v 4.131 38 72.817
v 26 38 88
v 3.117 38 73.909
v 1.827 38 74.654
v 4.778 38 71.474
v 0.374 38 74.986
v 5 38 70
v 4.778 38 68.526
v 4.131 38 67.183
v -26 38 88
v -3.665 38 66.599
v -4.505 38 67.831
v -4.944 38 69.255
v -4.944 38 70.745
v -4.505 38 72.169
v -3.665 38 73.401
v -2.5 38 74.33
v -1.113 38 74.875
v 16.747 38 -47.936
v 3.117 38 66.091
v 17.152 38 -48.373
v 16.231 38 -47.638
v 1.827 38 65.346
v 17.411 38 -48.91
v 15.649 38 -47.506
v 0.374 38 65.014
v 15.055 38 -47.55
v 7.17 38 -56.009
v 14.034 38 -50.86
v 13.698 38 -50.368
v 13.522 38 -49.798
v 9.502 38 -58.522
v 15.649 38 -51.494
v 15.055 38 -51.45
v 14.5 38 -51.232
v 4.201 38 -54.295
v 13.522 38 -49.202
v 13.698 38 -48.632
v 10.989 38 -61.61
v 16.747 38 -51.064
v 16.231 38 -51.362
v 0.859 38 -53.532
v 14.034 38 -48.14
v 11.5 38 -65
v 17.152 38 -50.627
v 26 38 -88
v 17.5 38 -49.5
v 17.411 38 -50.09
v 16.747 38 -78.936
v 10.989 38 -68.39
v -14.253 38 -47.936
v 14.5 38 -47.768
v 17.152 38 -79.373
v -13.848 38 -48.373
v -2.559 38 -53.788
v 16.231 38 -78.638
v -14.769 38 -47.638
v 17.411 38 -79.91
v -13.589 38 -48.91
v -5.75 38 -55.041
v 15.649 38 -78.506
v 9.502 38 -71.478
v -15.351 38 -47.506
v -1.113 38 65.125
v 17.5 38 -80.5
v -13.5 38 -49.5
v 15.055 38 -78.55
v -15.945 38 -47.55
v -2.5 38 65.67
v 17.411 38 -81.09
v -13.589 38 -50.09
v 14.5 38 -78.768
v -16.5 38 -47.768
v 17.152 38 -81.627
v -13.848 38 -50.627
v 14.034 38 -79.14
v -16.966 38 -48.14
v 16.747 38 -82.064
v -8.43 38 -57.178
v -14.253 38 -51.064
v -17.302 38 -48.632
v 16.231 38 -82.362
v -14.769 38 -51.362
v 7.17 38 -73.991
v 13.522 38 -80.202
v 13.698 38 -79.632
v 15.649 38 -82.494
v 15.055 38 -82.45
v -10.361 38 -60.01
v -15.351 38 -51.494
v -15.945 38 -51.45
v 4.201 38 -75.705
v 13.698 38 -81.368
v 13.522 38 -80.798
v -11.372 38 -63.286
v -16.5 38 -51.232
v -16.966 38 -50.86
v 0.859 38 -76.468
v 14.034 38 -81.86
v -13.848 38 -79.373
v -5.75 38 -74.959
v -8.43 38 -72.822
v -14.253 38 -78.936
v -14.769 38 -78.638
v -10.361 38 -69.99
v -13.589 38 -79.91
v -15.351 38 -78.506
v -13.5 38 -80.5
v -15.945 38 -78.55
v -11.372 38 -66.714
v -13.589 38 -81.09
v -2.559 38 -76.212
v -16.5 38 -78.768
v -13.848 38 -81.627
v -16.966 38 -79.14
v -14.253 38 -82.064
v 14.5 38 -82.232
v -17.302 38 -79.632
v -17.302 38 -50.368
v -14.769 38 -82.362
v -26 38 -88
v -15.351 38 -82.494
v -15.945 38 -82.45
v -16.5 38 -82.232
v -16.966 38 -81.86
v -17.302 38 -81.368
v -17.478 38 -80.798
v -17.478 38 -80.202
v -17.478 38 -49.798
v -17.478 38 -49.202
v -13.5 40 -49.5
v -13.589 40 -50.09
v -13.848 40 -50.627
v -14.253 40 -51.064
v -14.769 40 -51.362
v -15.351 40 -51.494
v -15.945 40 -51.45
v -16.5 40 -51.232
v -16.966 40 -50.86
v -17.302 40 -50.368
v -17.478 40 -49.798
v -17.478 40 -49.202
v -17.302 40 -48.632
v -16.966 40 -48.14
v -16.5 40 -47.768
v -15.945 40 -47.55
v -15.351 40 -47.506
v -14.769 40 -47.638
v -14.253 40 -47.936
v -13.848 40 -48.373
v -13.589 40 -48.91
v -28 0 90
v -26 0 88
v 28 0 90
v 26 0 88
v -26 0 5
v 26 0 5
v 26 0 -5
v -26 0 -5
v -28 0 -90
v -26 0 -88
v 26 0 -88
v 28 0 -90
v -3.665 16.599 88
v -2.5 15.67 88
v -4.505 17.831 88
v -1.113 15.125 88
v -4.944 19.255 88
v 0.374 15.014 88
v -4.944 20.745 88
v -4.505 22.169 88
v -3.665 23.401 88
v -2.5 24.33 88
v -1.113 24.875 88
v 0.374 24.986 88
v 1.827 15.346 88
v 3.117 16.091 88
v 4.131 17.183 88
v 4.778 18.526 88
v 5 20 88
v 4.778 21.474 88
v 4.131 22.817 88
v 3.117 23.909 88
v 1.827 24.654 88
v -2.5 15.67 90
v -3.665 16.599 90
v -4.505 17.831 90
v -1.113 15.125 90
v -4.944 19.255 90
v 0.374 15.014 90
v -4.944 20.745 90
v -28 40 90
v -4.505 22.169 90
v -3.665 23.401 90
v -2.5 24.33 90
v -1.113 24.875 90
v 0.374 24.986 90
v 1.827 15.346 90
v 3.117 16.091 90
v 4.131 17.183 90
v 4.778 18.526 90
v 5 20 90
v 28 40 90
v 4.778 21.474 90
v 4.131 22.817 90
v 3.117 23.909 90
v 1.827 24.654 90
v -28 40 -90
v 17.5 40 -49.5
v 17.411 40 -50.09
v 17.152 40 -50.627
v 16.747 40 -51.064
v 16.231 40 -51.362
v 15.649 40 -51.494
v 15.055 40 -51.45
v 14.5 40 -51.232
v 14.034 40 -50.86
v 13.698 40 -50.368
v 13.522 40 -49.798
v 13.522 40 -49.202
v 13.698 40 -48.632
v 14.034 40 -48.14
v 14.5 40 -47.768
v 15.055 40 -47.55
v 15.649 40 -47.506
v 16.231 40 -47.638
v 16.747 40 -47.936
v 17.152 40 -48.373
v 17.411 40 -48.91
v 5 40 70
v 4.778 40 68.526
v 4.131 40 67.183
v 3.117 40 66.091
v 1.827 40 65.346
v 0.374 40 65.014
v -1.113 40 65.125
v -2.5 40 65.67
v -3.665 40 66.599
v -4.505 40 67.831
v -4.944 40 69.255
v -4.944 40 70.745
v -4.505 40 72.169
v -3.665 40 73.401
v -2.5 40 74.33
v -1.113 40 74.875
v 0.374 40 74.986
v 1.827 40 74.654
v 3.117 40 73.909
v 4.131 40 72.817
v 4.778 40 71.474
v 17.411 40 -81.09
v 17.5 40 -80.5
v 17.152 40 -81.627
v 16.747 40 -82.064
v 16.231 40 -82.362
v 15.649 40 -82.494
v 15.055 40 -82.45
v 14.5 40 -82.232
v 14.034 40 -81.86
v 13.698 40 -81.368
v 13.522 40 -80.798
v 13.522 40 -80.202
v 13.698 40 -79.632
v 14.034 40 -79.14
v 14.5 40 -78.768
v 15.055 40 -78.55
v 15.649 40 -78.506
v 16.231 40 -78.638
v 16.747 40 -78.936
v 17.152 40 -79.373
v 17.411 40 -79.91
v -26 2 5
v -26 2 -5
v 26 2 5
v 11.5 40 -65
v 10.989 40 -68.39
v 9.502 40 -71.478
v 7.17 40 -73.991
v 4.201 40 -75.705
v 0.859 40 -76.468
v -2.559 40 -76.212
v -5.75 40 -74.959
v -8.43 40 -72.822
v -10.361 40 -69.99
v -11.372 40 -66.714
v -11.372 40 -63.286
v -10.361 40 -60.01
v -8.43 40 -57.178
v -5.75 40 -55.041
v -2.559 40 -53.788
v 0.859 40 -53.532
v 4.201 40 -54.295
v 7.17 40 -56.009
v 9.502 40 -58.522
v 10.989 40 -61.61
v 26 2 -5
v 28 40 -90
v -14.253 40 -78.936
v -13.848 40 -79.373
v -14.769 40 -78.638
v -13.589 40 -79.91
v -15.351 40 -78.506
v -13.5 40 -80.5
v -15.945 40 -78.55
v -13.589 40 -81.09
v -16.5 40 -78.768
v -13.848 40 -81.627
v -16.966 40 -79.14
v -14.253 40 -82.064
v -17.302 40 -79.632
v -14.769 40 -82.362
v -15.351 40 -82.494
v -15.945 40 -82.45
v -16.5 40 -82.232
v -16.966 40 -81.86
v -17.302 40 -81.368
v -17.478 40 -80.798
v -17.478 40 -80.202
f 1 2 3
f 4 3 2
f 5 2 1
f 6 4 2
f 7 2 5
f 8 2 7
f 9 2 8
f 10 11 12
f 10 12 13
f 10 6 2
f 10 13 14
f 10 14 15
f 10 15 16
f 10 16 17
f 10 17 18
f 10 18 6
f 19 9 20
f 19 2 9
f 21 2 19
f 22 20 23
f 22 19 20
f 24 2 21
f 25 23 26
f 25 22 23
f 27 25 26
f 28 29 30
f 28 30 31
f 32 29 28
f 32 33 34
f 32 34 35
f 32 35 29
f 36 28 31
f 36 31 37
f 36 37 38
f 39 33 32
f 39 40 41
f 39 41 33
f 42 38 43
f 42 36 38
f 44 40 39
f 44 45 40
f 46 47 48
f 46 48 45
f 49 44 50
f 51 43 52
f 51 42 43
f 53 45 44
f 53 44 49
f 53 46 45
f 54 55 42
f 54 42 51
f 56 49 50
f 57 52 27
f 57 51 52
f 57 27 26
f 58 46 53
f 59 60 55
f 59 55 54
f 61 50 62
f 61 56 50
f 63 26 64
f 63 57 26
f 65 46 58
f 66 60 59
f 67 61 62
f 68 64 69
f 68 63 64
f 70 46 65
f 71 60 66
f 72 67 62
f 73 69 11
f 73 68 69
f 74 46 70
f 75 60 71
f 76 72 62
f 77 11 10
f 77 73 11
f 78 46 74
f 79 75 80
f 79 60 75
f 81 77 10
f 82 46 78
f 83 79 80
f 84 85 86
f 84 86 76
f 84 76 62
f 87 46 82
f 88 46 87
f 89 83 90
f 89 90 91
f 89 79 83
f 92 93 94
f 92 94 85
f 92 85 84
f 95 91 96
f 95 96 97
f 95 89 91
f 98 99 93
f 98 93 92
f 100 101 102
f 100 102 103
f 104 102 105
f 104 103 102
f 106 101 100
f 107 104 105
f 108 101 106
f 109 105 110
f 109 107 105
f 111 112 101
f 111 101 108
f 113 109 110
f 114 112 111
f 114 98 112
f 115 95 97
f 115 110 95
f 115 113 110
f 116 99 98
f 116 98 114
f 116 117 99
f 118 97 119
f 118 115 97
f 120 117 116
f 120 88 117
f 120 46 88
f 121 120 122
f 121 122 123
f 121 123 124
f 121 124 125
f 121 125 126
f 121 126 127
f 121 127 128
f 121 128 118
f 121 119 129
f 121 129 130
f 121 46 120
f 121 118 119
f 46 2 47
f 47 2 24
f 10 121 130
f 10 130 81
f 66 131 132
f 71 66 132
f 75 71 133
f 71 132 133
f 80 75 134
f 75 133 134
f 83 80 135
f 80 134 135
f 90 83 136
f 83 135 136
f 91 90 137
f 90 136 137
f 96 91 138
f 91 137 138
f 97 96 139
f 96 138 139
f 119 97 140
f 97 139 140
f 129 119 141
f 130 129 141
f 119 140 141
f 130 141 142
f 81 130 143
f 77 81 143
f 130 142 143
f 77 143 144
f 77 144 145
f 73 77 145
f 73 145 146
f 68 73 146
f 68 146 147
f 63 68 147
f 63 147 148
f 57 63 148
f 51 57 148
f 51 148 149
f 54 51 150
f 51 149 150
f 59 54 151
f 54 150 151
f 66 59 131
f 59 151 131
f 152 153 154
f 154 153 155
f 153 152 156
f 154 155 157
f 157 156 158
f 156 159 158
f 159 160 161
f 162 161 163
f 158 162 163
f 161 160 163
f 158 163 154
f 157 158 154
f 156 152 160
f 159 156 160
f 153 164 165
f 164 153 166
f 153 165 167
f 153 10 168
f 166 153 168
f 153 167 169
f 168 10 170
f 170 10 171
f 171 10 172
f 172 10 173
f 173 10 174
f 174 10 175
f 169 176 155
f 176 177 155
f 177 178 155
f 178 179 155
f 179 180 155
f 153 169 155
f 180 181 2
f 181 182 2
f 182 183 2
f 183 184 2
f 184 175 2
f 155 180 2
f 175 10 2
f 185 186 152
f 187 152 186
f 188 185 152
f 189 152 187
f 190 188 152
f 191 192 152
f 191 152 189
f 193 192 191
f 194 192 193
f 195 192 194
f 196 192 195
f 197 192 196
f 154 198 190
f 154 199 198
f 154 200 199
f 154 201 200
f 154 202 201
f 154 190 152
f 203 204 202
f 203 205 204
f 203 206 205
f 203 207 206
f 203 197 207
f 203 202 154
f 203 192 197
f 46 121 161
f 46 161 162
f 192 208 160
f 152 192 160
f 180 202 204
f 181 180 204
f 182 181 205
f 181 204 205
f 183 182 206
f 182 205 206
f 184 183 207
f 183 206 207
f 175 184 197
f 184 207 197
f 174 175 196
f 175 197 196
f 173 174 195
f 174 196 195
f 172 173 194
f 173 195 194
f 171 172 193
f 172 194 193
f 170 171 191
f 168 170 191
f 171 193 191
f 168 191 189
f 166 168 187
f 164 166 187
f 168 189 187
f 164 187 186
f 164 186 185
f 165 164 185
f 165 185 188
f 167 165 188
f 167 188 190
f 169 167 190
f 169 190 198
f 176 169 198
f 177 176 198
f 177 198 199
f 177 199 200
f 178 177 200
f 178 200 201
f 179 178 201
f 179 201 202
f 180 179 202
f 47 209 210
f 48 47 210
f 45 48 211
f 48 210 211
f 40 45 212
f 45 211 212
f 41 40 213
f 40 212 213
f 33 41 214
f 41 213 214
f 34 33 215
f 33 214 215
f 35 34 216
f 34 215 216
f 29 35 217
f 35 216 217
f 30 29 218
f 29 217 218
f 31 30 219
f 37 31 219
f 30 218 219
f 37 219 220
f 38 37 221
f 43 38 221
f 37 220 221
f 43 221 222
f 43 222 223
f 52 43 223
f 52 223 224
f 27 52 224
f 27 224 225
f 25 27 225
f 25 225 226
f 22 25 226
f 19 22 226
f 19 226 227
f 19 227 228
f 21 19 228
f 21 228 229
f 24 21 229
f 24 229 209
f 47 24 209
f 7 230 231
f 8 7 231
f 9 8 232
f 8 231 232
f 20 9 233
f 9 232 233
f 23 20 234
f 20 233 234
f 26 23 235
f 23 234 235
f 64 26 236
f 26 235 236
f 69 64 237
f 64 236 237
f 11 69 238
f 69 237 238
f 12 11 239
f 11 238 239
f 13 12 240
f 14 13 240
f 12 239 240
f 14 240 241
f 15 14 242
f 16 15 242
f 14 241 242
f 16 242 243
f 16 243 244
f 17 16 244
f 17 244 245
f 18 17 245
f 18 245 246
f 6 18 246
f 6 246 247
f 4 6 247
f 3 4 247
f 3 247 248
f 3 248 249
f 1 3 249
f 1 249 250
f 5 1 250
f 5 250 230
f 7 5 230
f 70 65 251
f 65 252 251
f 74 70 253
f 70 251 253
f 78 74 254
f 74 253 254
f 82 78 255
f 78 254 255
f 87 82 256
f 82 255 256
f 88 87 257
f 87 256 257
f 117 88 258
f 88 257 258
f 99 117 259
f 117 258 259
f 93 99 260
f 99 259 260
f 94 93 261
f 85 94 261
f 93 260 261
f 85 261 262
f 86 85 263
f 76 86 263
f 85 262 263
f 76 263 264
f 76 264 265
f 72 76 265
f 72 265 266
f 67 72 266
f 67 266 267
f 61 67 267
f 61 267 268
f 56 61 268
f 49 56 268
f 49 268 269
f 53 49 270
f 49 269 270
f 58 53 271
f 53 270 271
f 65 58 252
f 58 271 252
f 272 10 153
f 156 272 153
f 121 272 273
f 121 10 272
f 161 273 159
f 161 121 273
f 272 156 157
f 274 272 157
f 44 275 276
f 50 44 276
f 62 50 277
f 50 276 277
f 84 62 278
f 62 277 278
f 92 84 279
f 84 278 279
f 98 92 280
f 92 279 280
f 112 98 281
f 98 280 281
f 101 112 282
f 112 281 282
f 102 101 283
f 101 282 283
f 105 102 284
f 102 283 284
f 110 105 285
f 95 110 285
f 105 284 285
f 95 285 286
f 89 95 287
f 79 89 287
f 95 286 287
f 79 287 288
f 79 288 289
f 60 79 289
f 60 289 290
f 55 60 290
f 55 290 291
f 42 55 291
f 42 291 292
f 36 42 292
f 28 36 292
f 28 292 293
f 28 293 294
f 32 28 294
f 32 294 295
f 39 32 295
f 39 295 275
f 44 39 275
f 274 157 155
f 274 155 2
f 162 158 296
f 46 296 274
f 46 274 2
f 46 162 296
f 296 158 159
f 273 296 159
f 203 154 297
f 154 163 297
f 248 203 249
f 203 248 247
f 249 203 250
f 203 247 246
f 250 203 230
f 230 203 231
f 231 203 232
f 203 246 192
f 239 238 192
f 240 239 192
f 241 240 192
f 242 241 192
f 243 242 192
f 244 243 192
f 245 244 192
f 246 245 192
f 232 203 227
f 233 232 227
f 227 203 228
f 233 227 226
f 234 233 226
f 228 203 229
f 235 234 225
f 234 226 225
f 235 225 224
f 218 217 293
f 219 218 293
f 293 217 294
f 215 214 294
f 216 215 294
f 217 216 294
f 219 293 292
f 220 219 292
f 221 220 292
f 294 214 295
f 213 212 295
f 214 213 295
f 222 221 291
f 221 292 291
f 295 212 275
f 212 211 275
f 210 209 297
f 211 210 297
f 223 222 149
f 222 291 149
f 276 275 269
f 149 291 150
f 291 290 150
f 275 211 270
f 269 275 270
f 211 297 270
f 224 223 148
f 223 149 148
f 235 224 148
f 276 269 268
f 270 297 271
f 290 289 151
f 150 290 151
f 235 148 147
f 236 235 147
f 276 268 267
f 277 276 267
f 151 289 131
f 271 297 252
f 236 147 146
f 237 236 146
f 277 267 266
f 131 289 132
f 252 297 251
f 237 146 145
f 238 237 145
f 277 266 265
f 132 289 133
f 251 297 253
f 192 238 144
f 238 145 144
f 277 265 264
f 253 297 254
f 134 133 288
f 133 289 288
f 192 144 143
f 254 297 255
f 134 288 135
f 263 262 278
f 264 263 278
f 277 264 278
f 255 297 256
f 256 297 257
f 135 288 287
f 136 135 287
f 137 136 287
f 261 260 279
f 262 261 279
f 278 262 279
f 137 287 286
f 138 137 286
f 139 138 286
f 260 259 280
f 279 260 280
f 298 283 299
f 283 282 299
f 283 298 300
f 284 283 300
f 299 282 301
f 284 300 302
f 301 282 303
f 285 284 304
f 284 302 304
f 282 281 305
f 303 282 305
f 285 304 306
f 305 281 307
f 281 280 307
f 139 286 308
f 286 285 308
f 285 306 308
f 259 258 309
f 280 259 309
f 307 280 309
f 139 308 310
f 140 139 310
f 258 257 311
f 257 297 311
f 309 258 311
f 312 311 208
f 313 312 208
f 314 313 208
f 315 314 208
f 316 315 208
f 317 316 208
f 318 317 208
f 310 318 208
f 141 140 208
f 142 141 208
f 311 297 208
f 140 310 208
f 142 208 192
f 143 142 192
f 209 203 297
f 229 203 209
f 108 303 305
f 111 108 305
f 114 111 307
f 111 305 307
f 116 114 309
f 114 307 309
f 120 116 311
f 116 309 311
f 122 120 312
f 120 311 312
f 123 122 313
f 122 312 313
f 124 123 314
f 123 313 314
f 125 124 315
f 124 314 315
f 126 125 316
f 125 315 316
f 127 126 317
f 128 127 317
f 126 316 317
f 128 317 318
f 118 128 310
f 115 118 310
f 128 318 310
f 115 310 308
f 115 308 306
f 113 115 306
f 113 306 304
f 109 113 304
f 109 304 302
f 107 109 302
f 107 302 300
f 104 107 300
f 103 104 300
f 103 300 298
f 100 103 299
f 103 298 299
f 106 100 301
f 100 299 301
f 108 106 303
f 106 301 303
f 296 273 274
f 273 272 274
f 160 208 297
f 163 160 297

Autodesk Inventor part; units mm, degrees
ref_plane "YZ Plane" through (0, 0, 0) normal (1, 0, 0) x (0, 1, 0)
ref_plane "XZ Plane" through (0, 0, 0) normal (0, 1, 0) x (-1, 0, 0)
ref_plane "XY Plane" through (0, 0, 0) normal (0, 0, 1) x (1, 0, 0)
sketch "Sketch1" plane through (0, 0, 0) normal (0, 0, 1) x (1, 0, 0)
  line L0 (-28, 0) -> (28, 0)
  line L1 (28, 0) -> (28, 40)
  line L2 (28, 40) -> (-28, 40)
  line L3 (-28, 40) -> (-28, 0)
  point P0 (0, 0)
  point P1 (0, 0)
  dimension "d1" = 56
  dimension "d2" = 40
extrude "Extrusion1" add sketch "Sketch1" along normal mid plane 180
shell "Shell1" thickness 2 removed faces 1 at (-9.3333, 0, 30)
sketch "Sketch2" plane through (0, 0, 90) normal (0, 0, 1) x (1, 0, 0)
  circle A0 centre (0, 20) radius 5
  line L0 (-28, 0) -> (28, 0) construction
  line L1 (28, 0) -> (28, 40) construction
  point P0 (0, 0)
  point P1 (0, 0)
  point P2 (28, 20)
  dimension "d6" = 10
extrude "Extrusion2" cut sketch "Sketch2" against normal up to surface (2 mm away)
sketch "Sketch3" plane through (-28, 40, 90) normal (0, 1, 0) x (1, 0, 0)
  line L0 (56, 180) -> (56, 0) construction
  line L1 (56, 40) -> (0, 40) construction
  circle A0 centre (28, 155) radius 11.5
  circle A1 centre (12.5, 139.5) radius 2
  circle A2 centre (43.5, 170.5) radius 2
  circle A3 centre (12.5, 170.5) radius 2
  circle A4 centre (43.5, 139.5) radius 2
  line L2 (43.5, 139.5) -> (12.5, 139.5) construction
  line L3 (12.5, 139.5) -> (12.5, 170.5) construction
  line L4 (12.5, 170.5) -> (43.5, 170.5) construction
  line L5 (43.5, 170.5) -> (43.5, 139.5) construction
  line L6 (43.5, 139.5) -> (12.5, 170.5) construction
  line L7 (0, 0) -> (56, 0) construction
  line L8 (56, 0) -> (0, 40) construction
  line L9 (0, 180) -> (0, 0) construction
  circle A5 centre (28, 20) radius 5
  point P0 (28, 90)
  dimension "d9" = 40
  dimension "d10" = 4
  dimension "d11" = 23
  dimension "d12" = 115
  dimension "d13" = 31
  dimension "d16" = 10
extrude "Extrusion3" cut sketch "Sketch3" against normal up to surface (2 mm away)
sketch "Sketch4" plane through (-28, 0, 90) normal (0, -1, 0) x (1, 0, 0)
  line L0 (2, -178) -> (2, -2) projected
  line L1 (54, -95) -> (2, -95)
  line L2 (2, -95) -> (2, -85)
  line L3 (2, -85) -> (54, -85)
  line L4 (54, -85) -> (54, -95)
  line L5 (54, -95) -> (2, -85) construction
  line L6 (2, -95) -> (54, -85) construction
  point P0 (28, -90)
  dimension "d17" = 10
extrude "Extrusion4" add sketch "Sketch4" against normal blind 2
properties part number "Soporte_base"
